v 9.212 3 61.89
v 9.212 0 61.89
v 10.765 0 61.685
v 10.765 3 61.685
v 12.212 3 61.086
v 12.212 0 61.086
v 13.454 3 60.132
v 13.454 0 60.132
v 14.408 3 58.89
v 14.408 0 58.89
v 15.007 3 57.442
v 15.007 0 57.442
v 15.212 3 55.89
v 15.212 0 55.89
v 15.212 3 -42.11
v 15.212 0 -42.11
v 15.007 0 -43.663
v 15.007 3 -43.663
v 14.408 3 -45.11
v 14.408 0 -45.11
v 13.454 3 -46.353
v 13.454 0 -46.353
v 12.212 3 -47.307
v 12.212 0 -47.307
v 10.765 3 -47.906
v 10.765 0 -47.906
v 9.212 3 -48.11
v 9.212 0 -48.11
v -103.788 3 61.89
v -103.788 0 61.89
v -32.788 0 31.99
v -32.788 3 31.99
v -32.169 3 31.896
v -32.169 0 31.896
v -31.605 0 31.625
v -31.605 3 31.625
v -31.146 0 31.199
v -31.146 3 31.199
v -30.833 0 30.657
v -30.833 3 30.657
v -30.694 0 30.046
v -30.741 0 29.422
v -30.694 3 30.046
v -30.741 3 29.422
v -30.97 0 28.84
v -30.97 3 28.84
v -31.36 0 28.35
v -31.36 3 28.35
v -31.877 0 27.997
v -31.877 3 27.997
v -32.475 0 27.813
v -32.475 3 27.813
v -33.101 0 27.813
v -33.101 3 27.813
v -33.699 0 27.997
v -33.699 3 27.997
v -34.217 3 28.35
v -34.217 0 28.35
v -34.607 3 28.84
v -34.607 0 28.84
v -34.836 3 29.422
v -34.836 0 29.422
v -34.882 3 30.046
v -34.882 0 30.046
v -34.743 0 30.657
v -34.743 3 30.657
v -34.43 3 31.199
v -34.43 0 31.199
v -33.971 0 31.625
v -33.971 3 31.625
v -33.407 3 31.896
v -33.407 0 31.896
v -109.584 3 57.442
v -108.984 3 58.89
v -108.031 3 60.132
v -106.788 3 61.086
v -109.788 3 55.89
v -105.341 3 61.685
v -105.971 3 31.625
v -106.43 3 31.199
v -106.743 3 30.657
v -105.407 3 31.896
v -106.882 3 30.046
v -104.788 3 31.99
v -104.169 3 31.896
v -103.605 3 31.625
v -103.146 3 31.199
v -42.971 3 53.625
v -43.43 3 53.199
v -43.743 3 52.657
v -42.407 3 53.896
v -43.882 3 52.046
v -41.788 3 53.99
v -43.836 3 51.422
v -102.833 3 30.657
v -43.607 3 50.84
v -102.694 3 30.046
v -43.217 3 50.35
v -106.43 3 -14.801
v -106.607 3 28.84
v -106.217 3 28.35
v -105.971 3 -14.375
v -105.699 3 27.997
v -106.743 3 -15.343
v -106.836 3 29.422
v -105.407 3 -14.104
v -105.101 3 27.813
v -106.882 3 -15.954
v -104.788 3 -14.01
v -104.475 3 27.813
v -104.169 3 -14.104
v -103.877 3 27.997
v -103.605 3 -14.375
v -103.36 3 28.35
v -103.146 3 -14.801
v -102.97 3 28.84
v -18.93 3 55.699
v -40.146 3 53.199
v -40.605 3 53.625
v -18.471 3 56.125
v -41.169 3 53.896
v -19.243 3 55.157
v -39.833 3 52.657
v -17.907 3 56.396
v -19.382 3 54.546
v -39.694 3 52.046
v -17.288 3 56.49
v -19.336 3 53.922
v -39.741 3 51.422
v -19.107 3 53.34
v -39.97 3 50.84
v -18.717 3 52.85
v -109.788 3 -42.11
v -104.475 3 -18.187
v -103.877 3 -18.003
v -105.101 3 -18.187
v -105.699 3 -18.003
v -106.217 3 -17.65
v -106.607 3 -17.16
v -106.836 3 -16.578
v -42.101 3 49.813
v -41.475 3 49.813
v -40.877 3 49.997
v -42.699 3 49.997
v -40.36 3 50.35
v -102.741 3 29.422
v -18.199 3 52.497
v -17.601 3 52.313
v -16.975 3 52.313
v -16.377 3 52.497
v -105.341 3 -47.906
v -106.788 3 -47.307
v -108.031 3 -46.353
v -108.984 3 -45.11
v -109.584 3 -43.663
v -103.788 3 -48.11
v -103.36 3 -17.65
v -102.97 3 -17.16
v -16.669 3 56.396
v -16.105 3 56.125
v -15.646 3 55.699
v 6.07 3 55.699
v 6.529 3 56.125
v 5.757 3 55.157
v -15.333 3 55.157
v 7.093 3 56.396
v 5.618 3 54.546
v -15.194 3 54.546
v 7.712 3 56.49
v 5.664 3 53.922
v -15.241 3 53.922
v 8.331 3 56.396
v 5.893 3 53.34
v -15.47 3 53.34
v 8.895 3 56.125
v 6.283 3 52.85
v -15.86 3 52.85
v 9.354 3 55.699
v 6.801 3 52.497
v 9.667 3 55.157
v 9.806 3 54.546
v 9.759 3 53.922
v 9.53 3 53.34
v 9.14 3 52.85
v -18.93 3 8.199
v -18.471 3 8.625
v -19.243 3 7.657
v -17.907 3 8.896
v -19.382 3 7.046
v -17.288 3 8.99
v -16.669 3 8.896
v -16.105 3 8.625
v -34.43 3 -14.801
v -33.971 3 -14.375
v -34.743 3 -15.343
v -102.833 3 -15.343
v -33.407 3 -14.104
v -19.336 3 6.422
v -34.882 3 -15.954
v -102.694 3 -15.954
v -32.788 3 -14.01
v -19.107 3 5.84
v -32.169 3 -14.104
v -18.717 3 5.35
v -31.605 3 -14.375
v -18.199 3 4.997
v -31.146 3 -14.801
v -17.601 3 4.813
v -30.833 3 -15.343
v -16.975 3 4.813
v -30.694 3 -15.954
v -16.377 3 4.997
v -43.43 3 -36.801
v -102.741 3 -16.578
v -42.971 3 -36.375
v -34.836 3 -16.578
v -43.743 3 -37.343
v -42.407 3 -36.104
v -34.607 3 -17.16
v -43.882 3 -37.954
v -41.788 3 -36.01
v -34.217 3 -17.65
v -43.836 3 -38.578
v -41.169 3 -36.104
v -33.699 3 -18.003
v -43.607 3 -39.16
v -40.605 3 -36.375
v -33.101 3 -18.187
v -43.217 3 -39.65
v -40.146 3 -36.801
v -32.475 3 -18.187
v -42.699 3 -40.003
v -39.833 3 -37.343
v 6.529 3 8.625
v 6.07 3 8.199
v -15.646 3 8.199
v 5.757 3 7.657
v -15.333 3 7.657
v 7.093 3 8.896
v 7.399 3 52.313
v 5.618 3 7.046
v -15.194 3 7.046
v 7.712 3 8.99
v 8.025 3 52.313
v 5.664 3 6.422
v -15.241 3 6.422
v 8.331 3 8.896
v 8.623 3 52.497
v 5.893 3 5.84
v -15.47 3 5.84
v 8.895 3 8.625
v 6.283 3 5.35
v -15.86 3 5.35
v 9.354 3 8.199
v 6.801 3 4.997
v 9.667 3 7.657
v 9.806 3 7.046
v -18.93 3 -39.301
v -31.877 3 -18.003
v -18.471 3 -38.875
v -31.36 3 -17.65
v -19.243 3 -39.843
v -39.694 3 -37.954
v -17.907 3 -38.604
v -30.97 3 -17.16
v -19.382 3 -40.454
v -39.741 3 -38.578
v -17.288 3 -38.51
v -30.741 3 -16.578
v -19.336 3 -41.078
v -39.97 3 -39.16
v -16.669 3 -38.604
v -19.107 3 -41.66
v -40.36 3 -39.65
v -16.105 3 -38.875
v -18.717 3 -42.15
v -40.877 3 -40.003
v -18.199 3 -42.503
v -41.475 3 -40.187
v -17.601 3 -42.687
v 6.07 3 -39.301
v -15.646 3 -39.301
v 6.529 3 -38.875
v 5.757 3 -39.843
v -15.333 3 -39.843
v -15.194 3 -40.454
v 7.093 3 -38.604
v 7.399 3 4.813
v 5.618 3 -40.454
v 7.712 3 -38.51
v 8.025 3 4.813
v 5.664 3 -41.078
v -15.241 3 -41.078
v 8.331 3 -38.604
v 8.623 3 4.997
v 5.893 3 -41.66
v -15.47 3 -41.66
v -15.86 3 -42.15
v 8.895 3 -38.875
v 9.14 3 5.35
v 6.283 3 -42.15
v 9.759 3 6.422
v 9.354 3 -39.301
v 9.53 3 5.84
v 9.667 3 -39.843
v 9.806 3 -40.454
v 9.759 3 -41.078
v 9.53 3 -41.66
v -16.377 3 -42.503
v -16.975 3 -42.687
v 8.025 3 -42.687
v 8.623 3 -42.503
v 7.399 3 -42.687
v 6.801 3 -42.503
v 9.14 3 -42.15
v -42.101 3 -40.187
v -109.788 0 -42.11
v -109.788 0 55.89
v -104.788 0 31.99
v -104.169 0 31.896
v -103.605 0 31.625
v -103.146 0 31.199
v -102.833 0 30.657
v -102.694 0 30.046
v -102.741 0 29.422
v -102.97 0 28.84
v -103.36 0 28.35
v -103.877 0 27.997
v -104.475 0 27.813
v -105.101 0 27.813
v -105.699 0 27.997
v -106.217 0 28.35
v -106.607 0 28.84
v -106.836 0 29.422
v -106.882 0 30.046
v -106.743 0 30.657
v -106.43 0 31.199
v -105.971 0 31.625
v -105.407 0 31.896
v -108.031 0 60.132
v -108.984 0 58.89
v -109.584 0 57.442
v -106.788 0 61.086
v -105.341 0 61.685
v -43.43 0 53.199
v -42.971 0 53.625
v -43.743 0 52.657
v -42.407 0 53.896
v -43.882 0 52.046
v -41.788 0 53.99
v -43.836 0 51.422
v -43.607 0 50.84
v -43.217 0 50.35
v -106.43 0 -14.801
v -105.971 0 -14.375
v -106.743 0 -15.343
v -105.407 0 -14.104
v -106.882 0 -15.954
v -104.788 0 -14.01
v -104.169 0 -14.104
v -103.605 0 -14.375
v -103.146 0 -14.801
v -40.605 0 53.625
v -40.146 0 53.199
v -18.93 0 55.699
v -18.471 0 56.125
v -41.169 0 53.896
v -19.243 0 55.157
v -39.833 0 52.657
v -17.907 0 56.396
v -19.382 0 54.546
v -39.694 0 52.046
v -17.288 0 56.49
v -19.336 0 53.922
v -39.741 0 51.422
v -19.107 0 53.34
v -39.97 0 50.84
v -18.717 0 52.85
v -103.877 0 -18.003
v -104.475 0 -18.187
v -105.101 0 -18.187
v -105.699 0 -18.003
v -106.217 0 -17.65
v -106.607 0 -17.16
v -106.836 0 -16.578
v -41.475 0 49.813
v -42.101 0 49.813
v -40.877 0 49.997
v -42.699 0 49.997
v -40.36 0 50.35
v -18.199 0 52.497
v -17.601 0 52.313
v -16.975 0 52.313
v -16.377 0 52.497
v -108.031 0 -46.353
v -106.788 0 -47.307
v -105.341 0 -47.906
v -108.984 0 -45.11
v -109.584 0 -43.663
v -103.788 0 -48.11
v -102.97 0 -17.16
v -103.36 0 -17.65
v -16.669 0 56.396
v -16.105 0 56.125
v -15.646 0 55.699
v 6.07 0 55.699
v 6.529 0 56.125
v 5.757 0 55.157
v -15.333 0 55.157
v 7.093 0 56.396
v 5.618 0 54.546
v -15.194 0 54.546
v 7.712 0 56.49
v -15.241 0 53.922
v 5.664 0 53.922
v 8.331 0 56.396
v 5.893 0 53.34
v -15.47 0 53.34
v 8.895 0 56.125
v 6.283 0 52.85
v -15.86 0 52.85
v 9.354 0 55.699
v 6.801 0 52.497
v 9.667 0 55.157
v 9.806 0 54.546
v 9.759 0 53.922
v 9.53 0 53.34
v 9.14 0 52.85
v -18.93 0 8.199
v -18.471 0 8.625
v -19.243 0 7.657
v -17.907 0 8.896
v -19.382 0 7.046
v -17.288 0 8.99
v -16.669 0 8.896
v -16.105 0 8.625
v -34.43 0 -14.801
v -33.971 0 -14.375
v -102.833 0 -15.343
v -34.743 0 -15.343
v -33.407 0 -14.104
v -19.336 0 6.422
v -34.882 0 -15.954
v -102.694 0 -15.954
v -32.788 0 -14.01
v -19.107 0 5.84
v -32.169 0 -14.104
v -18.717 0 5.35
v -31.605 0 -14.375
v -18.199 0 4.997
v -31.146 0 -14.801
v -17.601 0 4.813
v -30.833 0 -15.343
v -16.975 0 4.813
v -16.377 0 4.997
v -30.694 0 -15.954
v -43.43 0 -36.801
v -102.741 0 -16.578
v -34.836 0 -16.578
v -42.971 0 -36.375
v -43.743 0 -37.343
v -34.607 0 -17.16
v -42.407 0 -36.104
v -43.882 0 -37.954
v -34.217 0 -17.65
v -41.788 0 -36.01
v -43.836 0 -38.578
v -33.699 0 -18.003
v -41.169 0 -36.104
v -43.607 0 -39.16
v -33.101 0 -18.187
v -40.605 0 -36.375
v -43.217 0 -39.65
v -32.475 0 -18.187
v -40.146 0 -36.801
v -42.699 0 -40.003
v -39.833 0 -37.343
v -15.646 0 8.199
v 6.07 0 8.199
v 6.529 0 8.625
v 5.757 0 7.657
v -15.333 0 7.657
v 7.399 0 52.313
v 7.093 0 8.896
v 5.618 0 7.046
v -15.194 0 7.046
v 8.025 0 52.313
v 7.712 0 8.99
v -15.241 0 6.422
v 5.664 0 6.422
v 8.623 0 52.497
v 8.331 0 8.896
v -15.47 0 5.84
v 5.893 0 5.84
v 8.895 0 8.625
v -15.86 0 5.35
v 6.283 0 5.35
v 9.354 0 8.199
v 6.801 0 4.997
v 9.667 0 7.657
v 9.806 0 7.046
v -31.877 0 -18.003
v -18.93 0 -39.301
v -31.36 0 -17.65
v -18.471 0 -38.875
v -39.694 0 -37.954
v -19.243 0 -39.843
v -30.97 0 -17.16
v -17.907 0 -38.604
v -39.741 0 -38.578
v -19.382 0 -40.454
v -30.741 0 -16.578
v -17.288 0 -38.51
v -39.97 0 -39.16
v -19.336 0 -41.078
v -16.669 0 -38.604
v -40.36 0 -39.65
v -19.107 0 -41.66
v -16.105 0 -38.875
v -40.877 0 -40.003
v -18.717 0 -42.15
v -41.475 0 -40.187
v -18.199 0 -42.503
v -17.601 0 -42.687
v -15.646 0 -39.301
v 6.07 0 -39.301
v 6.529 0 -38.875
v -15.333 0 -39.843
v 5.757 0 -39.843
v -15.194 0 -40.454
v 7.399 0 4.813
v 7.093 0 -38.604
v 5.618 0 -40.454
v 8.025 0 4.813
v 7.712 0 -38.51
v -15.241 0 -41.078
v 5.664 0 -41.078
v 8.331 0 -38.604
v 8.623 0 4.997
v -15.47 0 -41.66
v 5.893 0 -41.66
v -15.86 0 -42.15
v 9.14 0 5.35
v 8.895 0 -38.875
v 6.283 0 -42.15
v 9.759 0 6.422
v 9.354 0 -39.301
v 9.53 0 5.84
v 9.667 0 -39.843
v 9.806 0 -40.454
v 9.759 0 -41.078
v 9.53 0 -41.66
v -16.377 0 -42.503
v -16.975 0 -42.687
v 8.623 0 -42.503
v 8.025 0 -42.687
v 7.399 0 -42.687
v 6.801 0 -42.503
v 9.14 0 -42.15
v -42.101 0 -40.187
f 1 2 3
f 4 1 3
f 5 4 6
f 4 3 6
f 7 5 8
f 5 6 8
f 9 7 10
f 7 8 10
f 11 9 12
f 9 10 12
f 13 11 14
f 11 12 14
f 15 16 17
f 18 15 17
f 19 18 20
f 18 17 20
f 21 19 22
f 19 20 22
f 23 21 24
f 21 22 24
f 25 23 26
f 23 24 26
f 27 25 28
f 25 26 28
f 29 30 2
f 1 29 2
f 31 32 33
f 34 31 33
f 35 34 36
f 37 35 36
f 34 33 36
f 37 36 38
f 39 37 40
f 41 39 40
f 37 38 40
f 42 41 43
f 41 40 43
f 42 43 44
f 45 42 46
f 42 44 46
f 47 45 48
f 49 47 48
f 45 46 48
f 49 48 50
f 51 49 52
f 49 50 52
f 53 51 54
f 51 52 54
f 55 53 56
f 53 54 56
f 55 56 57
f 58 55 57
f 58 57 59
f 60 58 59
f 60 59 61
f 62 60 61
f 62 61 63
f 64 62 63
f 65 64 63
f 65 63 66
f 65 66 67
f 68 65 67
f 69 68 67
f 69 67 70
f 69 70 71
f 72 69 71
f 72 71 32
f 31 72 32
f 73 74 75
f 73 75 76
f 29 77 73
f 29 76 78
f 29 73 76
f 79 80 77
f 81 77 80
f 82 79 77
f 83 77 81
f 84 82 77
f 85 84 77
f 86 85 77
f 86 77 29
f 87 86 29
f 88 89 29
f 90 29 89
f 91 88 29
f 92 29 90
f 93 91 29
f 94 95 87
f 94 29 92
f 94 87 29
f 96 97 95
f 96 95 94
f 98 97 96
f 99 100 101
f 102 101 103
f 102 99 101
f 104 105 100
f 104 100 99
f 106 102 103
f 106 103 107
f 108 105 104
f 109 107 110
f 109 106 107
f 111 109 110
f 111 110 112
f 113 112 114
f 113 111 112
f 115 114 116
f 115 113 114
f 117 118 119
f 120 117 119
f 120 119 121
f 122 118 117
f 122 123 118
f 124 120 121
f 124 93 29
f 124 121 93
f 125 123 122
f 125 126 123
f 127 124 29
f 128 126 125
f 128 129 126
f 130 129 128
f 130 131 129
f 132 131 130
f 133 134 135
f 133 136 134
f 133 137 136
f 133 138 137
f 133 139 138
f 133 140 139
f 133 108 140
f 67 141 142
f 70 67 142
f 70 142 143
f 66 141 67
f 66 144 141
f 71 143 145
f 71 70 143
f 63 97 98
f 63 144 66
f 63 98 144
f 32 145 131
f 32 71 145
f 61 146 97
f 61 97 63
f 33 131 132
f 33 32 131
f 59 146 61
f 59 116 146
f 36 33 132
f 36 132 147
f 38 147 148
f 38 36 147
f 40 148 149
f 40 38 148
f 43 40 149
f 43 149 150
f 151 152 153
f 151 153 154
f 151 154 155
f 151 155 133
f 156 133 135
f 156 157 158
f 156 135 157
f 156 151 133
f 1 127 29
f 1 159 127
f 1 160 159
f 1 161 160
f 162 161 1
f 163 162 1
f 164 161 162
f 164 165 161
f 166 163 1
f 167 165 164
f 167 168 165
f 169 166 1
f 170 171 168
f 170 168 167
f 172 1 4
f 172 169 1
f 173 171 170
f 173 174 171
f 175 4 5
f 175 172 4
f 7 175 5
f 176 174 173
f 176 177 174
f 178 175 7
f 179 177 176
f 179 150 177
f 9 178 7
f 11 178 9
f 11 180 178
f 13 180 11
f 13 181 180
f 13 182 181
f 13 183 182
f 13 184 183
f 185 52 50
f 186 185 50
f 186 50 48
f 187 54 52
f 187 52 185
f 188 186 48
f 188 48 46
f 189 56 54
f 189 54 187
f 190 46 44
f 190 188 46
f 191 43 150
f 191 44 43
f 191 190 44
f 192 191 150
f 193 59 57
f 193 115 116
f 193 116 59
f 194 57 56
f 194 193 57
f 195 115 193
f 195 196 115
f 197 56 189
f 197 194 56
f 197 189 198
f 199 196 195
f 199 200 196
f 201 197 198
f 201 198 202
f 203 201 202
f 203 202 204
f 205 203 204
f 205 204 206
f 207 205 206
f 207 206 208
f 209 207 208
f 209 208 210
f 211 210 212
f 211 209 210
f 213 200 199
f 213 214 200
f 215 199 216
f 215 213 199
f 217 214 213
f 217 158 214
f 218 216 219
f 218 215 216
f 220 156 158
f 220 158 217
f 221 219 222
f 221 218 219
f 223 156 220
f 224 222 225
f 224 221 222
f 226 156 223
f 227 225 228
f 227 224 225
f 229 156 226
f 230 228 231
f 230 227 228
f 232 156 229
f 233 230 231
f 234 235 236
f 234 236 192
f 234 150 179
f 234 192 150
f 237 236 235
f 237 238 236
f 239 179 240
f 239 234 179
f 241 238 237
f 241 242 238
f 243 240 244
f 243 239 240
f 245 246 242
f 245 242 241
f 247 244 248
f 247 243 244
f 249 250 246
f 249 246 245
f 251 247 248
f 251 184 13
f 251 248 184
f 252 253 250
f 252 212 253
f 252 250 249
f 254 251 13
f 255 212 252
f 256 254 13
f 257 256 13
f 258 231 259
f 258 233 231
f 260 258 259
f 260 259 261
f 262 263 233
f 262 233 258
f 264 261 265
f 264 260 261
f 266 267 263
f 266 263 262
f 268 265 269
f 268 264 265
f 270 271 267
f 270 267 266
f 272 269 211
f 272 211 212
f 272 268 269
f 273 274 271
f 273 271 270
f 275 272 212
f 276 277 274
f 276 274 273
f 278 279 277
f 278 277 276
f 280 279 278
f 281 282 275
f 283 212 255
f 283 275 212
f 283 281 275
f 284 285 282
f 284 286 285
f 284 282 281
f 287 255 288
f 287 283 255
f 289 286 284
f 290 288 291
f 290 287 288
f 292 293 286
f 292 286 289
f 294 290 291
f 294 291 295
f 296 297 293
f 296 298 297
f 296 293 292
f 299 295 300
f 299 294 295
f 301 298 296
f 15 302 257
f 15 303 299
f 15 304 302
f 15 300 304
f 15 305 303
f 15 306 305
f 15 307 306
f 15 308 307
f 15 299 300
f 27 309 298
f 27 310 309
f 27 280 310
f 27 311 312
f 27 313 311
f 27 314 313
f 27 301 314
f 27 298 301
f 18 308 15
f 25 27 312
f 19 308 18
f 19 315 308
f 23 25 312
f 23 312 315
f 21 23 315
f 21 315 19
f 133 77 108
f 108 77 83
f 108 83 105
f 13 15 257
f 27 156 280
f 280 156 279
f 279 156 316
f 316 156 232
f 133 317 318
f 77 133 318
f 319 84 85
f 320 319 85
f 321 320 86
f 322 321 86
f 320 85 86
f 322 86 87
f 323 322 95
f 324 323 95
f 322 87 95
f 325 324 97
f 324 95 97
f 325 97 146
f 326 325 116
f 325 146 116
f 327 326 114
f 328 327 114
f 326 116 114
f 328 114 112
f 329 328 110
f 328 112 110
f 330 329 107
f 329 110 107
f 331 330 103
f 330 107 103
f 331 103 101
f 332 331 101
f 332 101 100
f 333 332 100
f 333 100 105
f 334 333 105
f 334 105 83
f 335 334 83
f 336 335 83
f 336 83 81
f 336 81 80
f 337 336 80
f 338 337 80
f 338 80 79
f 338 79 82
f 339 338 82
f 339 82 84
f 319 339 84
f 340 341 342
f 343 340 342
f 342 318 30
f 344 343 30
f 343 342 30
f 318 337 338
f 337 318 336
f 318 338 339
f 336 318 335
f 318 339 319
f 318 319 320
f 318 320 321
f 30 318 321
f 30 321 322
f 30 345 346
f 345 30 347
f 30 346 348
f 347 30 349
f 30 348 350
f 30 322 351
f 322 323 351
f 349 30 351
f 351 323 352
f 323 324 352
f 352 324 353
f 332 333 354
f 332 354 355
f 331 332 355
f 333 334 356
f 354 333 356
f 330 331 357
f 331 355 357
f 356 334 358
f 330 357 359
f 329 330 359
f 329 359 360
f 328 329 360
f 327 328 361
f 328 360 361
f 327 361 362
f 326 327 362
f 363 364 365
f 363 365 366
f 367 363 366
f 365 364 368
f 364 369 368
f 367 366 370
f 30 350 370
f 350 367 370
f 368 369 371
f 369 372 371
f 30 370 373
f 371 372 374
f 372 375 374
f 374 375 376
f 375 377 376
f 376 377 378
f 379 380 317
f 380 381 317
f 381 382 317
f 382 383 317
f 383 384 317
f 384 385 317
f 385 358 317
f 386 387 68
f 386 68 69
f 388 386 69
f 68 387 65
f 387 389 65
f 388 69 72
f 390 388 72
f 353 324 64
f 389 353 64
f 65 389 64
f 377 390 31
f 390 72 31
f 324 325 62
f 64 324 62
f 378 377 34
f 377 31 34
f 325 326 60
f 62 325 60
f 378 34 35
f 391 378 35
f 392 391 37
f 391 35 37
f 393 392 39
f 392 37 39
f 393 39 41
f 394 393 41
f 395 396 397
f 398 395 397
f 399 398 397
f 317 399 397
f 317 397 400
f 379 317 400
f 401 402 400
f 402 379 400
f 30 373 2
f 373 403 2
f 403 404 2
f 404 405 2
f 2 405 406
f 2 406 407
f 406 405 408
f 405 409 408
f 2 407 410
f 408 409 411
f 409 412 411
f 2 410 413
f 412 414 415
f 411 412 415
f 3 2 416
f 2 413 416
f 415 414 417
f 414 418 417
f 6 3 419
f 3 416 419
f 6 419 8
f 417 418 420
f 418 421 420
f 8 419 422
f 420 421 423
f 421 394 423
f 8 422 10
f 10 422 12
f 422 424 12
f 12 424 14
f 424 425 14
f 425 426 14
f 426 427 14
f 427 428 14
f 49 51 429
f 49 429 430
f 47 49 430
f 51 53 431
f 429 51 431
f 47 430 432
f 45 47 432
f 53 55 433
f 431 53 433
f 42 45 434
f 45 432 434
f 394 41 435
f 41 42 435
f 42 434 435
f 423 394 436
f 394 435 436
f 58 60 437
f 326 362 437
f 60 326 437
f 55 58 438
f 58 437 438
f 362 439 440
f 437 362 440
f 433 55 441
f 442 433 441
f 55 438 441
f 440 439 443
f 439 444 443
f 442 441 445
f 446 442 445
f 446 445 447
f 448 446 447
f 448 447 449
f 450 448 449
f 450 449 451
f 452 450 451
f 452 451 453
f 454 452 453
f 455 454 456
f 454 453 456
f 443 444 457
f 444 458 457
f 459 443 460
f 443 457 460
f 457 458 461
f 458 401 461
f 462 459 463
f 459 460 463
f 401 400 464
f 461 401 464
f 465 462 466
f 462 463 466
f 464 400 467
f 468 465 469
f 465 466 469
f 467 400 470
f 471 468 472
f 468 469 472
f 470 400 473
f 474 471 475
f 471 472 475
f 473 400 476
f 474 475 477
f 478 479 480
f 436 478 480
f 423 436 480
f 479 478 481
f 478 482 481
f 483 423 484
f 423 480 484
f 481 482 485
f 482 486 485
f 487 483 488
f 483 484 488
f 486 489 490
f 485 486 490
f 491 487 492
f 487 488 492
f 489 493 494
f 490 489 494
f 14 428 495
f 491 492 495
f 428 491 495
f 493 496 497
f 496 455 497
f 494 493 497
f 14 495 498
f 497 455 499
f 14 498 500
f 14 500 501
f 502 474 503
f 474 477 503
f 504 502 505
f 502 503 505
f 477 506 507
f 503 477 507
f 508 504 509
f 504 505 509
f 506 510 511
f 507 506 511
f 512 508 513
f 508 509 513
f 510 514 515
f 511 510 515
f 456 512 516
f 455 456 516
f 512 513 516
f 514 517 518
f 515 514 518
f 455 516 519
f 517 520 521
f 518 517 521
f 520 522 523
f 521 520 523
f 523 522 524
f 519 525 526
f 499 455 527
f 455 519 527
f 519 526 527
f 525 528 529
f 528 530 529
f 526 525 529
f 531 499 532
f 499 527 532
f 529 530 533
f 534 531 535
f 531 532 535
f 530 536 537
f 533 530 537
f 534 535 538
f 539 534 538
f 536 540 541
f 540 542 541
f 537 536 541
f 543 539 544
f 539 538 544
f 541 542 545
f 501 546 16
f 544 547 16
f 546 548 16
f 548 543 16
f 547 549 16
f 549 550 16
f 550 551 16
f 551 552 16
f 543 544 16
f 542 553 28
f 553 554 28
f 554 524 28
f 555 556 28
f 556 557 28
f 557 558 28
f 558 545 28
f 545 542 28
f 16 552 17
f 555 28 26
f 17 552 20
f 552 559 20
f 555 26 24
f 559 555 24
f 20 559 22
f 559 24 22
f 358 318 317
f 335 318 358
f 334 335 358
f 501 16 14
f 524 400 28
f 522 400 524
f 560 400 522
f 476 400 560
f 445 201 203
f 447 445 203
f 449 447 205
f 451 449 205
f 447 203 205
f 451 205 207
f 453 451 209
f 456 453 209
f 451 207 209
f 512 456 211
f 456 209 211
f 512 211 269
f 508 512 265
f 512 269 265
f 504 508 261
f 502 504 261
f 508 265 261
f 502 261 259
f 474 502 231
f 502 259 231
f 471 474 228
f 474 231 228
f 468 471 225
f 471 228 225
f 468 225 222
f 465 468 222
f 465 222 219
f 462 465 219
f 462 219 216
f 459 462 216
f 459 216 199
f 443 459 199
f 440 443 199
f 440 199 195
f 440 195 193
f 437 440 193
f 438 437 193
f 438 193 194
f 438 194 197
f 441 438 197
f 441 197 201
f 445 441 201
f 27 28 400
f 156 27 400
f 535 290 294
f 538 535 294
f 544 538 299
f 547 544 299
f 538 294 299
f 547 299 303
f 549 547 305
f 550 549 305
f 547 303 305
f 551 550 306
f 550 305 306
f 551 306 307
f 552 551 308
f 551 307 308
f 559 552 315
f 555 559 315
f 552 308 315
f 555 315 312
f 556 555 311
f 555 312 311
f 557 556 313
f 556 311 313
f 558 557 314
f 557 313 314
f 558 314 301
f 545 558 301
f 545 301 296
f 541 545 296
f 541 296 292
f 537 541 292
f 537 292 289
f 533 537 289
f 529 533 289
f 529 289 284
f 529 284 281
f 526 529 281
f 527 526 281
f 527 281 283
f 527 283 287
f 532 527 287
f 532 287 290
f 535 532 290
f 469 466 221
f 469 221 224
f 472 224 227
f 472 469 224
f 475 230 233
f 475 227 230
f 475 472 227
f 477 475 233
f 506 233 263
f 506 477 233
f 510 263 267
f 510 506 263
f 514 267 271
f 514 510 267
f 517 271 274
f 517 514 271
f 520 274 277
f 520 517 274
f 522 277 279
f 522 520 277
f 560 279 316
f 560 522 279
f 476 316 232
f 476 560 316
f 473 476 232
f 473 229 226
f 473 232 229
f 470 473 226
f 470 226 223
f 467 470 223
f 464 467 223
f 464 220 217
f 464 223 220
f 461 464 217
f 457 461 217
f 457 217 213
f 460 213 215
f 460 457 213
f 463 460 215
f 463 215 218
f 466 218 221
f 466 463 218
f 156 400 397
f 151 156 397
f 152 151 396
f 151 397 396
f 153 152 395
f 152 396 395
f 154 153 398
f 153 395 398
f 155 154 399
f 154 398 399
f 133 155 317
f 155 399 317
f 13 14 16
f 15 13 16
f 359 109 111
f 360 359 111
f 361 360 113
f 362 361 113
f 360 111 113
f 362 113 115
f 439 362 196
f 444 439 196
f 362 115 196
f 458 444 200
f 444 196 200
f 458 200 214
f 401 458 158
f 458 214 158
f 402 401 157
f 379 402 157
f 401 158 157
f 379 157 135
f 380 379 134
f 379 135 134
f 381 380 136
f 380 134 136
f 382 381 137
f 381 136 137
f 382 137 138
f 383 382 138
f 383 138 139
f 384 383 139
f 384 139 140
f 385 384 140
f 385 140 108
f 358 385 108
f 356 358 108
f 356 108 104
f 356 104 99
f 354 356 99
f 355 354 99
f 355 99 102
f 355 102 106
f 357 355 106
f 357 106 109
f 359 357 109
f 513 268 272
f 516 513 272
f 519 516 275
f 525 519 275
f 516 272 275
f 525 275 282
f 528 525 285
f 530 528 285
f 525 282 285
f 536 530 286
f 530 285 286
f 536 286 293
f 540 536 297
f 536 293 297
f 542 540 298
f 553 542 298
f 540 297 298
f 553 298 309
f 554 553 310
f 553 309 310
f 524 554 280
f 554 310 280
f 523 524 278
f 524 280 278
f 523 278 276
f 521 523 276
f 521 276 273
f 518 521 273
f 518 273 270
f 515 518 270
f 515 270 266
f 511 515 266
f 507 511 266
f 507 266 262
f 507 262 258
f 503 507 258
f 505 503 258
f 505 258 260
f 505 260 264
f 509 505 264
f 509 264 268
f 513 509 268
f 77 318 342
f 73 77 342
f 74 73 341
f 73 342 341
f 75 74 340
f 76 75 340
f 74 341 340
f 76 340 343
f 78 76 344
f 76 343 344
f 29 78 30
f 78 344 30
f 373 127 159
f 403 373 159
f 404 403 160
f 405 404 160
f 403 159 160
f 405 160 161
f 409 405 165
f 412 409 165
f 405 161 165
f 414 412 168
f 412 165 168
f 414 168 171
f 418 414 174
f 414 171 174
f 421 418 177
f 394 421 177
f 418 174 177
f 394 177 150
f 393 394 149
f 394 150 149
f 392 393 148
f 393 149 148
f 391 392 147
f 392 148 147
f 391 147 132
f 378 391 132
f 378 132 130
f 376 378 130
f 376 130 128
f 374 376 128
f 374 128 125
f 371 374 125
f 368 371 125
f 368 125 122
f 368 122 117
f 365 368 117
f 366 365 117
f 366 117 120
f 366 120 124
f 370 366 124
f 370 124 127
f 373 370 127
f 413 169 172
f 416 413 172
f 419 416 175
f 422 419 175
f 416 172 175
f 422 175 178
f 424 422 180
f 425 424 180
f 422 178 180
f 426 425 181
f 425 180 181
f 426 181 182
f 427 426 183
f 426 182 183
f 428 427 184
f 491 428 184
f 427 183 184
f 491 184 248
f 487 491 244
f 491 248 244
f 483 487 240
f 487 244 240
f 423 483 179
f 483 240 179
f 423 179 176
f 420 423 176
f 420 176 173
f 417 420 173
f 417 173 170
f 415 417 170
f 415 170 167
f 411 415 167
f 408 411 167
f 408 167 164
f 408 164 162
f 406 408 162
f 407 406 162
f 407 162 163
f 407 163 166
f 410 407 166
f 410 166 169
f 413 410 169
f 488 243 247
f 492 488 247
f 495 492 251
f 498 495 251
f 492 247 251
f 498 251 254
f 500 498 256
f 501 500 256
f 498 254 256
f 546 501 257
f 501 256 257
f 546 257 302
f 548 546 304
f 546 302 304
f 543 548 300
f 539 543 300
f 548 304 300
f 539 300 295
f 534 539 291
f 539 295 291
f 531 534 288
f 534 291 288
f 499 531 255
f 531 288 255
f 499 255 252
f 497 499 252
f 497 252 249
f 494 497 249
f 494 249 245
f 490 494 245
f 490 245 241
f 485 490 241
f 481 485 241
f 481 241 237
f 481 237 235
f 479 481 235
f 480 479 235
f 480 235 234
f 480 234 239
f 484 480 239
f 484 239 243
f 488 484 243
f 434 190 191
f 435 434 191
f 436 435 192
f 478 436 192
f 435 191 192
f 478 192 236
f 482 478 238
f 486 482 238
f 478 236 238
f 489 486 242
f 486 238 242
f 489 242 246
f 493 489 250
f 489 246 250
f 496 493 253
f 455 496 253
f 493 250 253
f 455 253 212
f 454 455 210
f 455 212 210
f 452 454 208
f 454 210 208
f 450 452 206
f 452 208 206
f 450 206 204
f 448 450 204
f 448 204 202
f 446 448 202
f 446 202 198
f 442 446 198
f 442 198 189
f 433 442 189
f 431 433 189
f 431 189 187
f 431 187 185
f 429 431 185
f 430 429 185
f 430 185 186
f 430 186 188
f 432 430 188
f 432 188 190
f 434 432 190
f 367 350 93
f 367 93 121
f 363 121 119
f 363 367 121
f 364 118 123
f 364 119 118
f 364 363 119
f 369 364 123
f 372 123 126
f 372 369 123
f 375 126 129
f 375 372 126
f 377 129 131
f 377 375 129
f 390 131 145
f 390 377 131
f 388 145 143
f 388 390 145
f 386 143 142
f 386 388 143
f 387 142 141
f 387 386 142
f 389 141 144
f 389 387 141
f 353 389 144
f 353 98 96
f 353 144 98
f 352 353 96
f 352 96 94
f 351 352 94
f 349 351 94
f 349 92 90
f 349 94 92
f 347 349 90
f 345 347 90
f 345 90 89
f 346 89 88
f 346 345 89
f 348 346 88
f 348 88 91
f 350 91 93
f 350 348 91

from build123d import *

# Parameters (mm, degrees)
EXTRUDE_1_DEPTH          = 3
SKETCH_2_R               = 2.1
CUT_EXTRUDE_1_DEPTH      = 127.066538846
SKETCH_3_R               = 2.1
CUT_EXTRUDE_2_DEPTH      = 127.066538846
CUT_EXTRUDE_3_DEPTH      = 127.066538846
CUT_EXTRUDE_3_DEPTH_BACK = 127.066538846
SKETCH_4_R               = 2.1


with BuildPart() as part:
    # 草图1 → 凸台-拉伸1 (new body)
    with BuildSketch(Plane(origin=(0, 0, 0), x_dir=(1, 0, 0), z_dir=(0, 1, 0))):
        with BuildLine():
            Line((-109.788244213, 42.110472219), (-109.788244213, -55.889527781))
            ThreePointArc((-109.788244213, -55.889527781), (-108.030884901, -60.132168469), (-103.788244213, -61.889527781))
            Line((-103.788244213, -61.889527781), (9.211755787, -61.889527781))
            ThreePointArc((9.211755787, -61.889527781), (13.454396474, -60.132168469), (15.211755787, -55.889527781))
            Line((15.211755787, -55.889527781), (15.211755787, 42.110472219))
            ThreePointArc((15.211755787, 42.110472219), (13.454396474, 46.353112906), (9.211755787, 48.110472219))
            Line((9.211755787, 48.110472219), (-103.788244213, 48.110472219))
            ThreePointArc((-103.788244213, 48.110472219), (-108.030884901, 46.353112906), (-109.788244213, 42.110472219))
        make_face()
    extrude(amount=EXTRUDE_1_DEPTH)

    # 草图2 → 切除-拉伸1 (cut, through all)
    with BuildSketch(Plane(origin=(0, 3, 0), x_dir=(1, 0, 0), z_dir=(0, 1, 0))):
        with Locations(Location((-17.288244213, -54.389527781, 0), (0, 0, 270))):
            Circle(SKETCH_2_R)
        with Locations(Location((7.711755787, -54.389527781, 0), (0, 0, 270))):
            Circle(SKETCH_2_R)
        with Locations(Location((-17.288244213, -6.889527781, 0), (0, 0, 270))):
            Circle(SKETCH_2_R)
        with Locations(Location((7.711755787, -6.889527781, 0), (0, 0, 270))):
            Circle(SKETCH_2_R)
        with Locations(Location((-17.288244213, 40.610472219, 0), (0, 0, 270))):
            Circle(SKETCH_2_R)
        with Locations(Location((7.711755787, 40.610472219, 0), (0, 0, 270))):
            Circle(SKETCH_2_R)
    extrude(amount=-CUT_EXTRUDE_1_DEPTH, mode=Mode.SUBTRACT)

    # 草图3 → 切除-拉伸2 (cut, through all)
    with BuildSketch(Plane(origin=(0, 3, 0), x_dir=(1, 0, 0), z_dir=(0, 1, 0))):
        with Locations(Location((-104.788244213, -29.889527781, 0), (0, 0, 270))):
            Circle(SKETCH_3_R)
        with Locations(Location((-104.788244213, 16.110472219, 0), (0, 0, 270))):
            Circle(SKETCH_3_R)
        with Locations(Location((-32.788244213, 16.110472219, 0), (0, 0, 270))):
            Circle(SKETCH_3_R)
        with Locations(Location((-32.788244213, -29.889527781, 0), (0, 0, 270))):
            Circle(SKETCH_3_R)
    extrude(amount=-CUT_EXTRUDE_2_DEPTH, mode=Mode.SUBTRACT)

    # 草图4 → 切除-拉伸3 (cut, two sides: drawn at the far end of the back side and taken through both)
    with BuildSketch(Plane(origin=(0, 3, 0), x_dir=(1, 0, 0), z_dir=(0, 1, 0)).offset(-CUT_EXTRUDE_3_DEPTH_BACK)):
        with Locations(Location((-41.788244213, -51.889527781, 0), (0, 0, 270))):
            Circle(SKETCH_4_R)
        with Locations(Location((-41.788244213, 38.110472219, 0), (0, 0, 270))):
            Circle(SKETCH_4_R)
    extrude(amount=CUT_EXTRUDE_3_DEPTH + CUT_EXTRUDE_3_DEPTH_BACK, mode=Mode.SUBTRACT)


solid = part.part
